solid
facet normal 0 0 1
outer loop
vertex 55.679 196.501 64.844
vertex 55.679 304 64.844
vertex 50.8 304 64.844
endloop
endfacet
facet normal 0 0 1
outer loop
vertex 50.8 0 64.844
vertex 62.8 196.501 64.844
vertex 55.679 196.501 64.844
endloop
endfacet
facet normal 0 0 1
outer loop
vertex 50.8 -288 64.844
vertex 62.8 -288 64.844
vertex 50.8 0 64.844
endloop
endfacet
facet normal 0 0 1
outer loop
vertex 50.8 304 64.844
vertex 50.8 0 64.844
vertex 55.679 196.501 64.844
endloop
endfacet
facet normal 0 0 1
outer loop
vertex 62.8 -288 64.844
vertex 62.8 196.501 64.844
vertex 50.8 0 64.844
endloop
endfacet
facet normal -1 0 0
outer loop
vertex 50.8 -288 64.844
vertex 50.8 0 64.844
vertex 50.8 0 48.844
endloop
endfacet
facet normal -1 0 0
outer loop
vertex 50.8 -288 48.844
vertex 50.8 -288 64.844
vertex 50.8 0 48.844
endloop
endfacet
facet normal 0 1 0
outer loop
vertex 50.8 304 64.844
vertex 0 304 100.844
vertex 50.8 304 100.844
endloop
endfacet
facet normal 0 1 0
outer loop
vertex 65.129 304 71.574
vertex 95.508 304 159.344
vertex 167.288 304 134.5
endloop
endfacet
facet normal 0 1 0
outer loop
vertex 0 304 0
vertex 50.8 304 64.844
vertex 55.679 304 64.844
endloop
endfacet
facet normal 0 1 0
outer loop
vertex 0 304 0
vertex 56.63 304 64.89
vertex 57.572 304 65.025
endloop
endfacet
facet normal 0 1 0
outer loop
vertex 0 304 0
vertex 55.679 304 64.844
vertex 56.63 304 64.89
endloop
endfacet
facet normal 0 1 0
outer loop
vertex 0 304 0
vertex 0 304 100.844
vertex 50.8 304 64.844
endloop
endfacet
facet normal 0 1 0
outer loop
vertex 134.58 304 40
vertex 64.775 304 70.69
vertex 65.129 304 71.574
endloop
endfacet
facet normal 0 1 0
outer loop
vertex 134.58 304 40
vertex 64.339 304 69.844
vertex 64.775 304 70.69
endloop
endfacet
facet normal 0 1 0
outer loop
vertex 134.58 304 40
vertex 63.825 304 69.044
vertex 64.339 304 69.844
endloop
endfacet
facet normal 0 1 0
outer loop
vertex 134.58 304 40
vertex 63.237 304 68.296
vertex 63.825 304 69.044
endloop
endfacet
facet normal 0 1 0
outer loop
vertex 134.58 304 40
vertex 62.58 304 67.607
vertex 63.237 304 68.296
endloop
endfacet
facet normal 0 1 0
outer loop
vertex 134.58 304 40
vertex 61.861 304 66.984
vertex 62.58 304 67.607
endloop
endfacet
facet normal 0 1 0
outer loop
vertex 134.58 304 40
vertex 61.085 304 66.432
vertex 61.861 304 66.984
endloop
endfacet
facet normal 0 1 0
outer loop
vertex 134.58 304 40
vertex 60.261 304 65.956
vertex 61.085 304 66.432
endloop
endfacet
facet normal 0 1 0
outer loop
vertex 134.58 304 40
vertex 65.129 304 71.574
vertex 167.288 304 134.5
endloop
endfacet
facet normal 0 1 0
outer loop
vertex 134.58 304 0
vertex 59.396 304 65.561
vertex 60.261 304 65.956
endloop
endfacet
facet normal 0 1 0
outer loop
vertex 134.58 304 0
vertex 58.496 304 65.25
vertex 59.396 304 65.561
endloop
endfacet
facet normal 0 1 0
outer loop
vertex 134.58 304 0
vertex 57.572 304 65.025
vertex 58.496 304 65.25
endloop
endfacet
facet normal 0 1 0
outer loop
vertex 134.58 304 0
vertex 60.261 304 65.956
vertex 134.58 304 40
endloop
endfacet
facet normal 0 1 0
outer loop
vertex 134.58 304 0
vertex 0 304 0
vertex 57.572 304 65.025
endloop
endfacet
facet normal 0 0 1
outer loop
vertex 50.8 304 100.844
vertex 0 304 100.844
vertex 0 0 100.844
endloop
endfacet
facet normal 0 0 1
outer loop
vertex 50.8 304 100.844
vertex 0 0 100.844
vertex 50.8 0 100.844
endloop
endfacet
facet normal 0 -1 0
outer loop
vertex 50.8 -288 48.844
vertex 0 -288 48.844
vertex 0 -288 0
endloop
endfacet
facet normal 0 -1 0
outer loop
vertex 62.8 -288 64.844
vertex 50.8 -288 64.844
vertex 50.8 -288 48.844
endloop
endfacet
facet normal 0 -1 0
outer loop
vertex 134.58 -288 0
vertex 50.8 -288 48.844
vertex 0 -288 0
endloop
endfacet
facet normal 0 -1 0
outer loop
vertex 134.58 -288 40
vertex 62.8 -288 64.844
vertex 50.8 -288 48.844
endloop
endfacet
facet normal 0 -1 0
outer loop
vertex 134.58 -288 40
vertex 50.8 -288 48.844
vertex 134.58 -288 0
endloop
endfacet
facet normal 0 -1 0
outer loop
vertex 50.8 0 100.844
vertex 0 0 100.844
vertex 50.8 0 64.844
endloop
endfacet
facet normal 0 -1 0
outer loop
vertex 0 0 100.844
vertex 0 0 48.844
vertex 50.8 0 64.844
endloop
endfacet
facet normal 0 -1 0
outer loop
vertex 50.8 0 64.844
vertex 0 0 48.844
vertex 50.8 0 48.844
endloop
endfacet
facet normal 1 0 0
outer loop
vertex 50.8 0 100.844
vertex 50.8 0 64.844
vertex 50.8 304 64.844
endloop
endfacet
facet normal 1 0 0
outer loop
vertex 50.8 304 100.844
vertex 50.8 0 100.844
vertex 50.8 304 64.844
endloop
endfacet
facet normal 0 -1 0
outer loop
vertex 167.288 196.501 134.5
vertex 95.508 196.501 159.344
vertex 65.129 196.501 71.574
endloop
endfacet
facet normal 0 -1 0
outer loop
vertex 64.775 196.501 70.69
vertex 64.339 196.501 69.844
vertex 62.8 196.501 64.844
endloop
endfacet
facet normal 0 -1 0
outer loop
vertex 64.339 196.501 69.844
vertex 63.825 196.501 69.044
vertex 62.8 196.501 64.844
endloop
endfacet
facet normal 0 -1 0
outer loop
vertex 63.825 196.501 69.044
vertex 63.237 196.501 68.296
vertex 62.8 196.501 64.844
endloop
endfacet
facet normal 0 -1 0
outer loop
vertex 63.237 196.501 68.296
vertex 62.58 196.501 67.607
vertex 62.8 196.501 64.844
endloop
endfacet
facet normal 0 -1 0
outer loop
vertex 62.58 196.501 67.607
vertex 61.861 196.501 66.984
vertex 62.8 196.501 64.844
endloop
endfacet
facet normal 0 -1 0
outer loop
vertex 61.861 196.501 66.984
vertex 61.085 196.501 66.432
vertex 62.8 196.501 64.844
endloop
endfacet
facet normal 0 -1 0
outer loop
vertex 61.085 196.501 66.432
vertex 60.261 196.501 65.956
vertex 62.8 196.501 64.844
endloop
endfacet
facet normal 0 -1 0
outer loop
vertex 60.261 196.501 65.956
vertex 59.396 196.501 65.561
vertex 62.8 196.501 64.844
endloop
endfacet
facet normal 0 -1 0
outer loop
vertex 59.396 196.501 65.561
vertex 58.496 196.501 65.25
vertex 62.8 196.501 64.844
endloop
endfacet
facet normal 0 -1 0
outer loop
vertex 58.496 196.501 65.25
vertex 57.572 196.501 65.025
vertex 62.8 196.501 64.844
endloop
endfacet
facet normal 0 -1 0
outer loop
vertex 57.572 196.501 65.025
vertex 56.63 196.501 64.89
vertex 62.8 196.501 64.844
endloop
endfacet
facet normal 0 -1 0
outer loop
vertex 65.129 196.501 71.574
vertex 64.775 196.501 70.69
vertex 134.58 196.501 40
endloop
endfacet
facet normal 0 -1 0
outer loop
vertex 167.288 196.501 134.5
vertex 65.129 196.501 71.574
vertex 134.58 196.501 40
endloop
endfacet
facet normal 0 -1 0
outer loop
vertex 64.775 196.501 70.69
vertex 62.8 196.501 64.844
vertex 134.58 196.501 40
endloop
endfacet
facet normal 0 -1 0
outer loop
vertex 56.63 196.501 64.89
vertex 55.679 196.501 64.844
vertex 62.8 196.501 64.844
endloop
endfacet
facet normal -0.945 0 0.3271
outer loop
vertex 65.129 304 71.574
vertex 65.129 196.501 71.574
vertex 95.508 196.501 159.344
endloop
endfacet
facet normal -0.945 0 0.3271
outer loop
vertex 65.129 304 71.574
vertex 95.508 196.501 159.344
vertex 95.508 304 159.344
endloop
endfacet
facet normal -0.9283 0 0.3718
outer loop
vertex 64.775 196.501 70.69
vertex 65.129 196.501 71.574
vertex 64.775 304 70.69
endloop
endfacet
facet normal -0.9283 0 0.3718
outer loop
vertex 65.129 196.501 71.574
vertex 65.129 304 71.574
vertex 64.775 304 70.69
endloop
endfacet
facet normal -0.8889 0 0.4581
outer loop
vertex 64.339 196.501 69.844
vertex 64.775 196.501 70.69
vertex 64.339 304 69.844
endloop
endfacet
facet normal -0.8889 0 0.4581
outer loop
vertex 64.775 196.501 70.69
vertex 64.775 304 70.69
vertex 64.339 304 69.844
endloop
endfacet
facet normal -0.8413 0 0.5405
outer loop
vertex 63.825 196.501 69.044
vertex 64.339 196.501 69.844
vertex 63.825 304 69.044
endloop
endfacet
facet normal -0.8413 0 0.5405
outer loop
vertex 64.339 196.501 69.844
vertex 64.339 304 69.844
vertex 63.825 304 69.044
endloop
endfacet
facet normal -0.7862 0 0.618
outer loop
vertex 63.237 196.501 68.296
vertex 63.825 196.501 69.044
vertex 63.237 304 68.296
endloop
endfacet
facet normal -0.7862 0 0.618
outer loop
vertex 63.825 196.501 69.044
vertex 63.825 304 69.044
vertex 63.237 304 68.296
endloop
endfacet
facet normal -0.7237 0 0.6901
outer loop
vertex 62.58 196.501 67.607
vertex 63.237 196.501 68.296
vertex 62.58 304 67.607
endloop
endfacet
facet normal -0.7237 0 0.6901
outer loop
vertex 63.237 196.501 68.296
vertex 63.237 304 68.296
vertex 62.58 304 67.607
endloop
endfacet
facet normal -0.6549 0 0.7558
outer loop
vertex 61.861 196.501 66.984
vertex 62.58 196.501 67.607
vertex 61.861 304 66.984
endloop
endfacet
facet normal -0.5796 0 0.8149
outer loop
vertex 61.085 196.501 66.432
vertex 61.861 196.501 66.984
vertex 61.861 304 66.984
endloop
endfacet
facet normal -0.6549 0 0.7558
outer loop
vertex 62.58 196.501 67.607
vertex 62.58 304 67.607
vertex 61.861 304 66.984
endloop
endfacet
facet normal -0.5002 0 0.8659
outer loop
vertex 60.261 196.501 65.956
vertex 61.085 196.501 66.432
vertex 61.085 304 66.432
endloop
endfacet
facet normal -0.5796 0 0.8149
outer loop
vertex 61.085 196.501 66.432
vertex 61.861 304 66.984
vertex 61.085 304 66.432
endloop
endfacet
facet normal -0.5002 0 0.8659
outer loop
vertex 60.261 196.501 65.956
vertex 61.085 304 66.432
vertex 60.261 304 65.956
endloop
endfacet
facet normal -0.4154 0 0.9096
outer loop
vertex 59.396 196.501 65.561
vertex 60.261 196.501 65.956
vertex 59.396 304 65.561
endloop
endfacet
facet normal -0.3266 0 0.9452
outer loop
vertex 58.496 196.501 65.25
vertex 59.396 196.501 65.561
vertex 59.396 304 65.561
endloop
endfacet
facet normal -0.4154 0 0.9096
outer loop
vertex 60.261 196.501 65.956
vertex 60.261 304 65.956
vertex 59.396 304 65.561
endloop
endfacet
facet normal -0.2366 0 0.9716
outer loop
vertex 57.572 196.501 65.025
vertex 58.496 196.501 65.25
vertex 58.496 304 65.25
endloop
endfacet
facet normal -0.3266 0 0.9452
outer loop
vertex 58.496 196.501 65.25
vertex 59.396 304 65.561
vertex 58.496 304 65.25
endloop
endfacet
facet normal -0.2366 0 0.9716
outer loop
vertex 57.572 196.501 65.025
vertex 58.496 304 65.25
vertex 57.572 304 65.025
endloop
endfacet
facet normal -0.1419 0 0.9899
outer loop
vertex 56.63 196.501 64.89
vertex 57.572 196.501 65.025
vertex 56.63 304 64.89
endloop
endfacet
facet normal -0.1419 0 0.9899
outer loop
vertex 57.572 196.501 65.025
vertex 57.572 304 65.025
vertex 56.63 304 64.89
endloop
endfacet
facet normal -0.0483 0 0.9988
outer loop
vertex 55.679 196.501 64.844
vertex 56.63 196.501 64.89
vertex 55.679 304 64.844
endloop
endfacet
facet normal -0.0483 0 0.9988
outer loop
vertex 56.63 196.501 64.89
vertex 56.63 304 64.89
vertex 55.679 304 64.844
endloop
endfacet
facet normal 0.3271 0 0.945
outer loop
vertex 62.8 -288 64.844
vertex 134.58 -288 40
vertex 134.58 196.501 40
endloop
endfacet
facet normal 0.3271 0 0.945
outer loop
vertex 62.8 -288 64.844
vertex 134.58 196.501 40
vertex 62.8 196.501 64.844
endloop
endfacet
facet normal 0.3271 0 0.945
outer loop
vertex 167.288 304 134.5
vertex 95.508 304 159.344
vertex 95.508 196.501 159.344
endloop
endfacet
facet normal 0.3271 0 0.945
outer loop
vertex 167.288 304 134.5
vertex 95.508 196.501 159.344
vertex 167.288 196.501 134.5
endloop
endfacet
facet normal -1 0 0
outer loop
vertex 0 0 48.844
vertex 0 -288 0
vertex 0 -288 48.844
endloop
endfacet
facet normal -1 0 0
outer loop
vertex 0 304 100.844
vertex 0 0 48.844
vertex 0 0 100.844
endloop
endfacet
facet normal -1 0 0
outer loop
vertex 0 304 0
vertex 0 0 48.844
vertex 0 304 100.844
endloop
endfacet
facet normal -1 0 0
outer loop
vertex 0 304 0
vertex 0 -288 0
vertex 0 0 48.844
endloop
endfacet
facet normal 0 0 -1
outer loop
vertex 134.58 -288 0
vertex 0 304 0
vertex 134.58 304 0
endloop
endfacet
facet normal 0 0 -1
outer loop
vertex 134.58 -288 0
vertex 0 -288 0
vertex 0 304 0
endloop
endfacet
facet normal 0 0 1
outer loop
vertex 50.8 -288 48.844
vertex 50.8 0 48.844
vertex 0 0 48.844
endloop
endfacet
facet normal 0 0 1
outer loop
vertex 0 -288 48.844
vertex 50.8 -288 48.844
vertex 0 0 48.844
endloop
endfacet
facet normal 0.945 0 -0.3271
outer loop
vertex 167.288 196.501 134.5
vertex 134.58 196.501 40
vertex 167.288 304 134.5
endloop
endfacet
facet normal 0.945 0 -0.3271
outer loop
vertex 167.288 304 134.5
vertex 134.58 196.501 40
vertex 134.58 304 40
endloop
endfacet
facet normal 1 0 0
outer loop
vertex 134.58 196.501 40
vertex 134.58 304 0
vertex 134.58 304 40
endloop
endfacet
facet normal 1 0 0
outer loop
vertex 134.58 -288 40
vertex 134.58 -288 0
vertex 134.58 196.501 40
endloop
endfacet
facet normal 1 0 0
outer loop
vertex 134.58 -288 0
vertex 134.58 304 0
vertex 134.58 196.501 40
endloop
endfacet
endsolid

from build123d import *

# Parameters (mm, degrees)
F1_DEPTH = 288
F3_DEPTH = 304
F5_W     = 50.8
F5_H     = 304
F6_DEPTH = 36
F7_W     = 75.9582033121
F7_H     = 107.4988492727
F8_DEPTH = 100
F9_R     = 10


with BuildPart() as f1:
    # F0 (on Front) → F1 (new body)
    with BuildSketch(Plane.XZ):
        Polygon((0, 48.8444454968), (0, 0), (134.5802352905, 0), (134.5802352905, 40), (62.8, 64.8444454968), (50.8, 64.8444454968), (50.8, 48.8444454968), align=None)
    extrude(amount=F1_DEPTH)

    # F2 (on Front) → F3 (join)
    with BuildSketch(Plane.XZ):
        Polygon((0, 0), (134.5802352905, 0), (134.5802352905, 40), (62.8, 64.8444454968), (0, 64.8444454968), align=None)
    extrude(amount=-F3_DEPTH)

    # F5 (on face) → F6 (join)
    with BuildSketch(Plane.XY.offset(64.8444454968)):
        with Locations((25.4, 152)):
            Rectangle(F5_W, F5_H)
    extrude(amount=F6_DEPTH)

    # F7 (on face) → F8 (join)
    with BuildSketch(Plane(origin=(26.7612103496, 0, 77.3181263313), x_dir=(0.944996487, 0, -0.3270804787), z_dir=(0.3270804787, 0, 0.944996487))):
        with Locations((76.1155287701, 250.2505753636)):
            Rectangle(F7_W, F7_H)
    extrude(amount=F8_DEPTH)

    # F9
    f9_edges = [f1.edges().sort_by_distance(p)[0] for p in [
        (62.8, 250.250575, 64.844445),
    ]]
    fillet(f9_edges, radius=F9_R)


solid = f1.part
